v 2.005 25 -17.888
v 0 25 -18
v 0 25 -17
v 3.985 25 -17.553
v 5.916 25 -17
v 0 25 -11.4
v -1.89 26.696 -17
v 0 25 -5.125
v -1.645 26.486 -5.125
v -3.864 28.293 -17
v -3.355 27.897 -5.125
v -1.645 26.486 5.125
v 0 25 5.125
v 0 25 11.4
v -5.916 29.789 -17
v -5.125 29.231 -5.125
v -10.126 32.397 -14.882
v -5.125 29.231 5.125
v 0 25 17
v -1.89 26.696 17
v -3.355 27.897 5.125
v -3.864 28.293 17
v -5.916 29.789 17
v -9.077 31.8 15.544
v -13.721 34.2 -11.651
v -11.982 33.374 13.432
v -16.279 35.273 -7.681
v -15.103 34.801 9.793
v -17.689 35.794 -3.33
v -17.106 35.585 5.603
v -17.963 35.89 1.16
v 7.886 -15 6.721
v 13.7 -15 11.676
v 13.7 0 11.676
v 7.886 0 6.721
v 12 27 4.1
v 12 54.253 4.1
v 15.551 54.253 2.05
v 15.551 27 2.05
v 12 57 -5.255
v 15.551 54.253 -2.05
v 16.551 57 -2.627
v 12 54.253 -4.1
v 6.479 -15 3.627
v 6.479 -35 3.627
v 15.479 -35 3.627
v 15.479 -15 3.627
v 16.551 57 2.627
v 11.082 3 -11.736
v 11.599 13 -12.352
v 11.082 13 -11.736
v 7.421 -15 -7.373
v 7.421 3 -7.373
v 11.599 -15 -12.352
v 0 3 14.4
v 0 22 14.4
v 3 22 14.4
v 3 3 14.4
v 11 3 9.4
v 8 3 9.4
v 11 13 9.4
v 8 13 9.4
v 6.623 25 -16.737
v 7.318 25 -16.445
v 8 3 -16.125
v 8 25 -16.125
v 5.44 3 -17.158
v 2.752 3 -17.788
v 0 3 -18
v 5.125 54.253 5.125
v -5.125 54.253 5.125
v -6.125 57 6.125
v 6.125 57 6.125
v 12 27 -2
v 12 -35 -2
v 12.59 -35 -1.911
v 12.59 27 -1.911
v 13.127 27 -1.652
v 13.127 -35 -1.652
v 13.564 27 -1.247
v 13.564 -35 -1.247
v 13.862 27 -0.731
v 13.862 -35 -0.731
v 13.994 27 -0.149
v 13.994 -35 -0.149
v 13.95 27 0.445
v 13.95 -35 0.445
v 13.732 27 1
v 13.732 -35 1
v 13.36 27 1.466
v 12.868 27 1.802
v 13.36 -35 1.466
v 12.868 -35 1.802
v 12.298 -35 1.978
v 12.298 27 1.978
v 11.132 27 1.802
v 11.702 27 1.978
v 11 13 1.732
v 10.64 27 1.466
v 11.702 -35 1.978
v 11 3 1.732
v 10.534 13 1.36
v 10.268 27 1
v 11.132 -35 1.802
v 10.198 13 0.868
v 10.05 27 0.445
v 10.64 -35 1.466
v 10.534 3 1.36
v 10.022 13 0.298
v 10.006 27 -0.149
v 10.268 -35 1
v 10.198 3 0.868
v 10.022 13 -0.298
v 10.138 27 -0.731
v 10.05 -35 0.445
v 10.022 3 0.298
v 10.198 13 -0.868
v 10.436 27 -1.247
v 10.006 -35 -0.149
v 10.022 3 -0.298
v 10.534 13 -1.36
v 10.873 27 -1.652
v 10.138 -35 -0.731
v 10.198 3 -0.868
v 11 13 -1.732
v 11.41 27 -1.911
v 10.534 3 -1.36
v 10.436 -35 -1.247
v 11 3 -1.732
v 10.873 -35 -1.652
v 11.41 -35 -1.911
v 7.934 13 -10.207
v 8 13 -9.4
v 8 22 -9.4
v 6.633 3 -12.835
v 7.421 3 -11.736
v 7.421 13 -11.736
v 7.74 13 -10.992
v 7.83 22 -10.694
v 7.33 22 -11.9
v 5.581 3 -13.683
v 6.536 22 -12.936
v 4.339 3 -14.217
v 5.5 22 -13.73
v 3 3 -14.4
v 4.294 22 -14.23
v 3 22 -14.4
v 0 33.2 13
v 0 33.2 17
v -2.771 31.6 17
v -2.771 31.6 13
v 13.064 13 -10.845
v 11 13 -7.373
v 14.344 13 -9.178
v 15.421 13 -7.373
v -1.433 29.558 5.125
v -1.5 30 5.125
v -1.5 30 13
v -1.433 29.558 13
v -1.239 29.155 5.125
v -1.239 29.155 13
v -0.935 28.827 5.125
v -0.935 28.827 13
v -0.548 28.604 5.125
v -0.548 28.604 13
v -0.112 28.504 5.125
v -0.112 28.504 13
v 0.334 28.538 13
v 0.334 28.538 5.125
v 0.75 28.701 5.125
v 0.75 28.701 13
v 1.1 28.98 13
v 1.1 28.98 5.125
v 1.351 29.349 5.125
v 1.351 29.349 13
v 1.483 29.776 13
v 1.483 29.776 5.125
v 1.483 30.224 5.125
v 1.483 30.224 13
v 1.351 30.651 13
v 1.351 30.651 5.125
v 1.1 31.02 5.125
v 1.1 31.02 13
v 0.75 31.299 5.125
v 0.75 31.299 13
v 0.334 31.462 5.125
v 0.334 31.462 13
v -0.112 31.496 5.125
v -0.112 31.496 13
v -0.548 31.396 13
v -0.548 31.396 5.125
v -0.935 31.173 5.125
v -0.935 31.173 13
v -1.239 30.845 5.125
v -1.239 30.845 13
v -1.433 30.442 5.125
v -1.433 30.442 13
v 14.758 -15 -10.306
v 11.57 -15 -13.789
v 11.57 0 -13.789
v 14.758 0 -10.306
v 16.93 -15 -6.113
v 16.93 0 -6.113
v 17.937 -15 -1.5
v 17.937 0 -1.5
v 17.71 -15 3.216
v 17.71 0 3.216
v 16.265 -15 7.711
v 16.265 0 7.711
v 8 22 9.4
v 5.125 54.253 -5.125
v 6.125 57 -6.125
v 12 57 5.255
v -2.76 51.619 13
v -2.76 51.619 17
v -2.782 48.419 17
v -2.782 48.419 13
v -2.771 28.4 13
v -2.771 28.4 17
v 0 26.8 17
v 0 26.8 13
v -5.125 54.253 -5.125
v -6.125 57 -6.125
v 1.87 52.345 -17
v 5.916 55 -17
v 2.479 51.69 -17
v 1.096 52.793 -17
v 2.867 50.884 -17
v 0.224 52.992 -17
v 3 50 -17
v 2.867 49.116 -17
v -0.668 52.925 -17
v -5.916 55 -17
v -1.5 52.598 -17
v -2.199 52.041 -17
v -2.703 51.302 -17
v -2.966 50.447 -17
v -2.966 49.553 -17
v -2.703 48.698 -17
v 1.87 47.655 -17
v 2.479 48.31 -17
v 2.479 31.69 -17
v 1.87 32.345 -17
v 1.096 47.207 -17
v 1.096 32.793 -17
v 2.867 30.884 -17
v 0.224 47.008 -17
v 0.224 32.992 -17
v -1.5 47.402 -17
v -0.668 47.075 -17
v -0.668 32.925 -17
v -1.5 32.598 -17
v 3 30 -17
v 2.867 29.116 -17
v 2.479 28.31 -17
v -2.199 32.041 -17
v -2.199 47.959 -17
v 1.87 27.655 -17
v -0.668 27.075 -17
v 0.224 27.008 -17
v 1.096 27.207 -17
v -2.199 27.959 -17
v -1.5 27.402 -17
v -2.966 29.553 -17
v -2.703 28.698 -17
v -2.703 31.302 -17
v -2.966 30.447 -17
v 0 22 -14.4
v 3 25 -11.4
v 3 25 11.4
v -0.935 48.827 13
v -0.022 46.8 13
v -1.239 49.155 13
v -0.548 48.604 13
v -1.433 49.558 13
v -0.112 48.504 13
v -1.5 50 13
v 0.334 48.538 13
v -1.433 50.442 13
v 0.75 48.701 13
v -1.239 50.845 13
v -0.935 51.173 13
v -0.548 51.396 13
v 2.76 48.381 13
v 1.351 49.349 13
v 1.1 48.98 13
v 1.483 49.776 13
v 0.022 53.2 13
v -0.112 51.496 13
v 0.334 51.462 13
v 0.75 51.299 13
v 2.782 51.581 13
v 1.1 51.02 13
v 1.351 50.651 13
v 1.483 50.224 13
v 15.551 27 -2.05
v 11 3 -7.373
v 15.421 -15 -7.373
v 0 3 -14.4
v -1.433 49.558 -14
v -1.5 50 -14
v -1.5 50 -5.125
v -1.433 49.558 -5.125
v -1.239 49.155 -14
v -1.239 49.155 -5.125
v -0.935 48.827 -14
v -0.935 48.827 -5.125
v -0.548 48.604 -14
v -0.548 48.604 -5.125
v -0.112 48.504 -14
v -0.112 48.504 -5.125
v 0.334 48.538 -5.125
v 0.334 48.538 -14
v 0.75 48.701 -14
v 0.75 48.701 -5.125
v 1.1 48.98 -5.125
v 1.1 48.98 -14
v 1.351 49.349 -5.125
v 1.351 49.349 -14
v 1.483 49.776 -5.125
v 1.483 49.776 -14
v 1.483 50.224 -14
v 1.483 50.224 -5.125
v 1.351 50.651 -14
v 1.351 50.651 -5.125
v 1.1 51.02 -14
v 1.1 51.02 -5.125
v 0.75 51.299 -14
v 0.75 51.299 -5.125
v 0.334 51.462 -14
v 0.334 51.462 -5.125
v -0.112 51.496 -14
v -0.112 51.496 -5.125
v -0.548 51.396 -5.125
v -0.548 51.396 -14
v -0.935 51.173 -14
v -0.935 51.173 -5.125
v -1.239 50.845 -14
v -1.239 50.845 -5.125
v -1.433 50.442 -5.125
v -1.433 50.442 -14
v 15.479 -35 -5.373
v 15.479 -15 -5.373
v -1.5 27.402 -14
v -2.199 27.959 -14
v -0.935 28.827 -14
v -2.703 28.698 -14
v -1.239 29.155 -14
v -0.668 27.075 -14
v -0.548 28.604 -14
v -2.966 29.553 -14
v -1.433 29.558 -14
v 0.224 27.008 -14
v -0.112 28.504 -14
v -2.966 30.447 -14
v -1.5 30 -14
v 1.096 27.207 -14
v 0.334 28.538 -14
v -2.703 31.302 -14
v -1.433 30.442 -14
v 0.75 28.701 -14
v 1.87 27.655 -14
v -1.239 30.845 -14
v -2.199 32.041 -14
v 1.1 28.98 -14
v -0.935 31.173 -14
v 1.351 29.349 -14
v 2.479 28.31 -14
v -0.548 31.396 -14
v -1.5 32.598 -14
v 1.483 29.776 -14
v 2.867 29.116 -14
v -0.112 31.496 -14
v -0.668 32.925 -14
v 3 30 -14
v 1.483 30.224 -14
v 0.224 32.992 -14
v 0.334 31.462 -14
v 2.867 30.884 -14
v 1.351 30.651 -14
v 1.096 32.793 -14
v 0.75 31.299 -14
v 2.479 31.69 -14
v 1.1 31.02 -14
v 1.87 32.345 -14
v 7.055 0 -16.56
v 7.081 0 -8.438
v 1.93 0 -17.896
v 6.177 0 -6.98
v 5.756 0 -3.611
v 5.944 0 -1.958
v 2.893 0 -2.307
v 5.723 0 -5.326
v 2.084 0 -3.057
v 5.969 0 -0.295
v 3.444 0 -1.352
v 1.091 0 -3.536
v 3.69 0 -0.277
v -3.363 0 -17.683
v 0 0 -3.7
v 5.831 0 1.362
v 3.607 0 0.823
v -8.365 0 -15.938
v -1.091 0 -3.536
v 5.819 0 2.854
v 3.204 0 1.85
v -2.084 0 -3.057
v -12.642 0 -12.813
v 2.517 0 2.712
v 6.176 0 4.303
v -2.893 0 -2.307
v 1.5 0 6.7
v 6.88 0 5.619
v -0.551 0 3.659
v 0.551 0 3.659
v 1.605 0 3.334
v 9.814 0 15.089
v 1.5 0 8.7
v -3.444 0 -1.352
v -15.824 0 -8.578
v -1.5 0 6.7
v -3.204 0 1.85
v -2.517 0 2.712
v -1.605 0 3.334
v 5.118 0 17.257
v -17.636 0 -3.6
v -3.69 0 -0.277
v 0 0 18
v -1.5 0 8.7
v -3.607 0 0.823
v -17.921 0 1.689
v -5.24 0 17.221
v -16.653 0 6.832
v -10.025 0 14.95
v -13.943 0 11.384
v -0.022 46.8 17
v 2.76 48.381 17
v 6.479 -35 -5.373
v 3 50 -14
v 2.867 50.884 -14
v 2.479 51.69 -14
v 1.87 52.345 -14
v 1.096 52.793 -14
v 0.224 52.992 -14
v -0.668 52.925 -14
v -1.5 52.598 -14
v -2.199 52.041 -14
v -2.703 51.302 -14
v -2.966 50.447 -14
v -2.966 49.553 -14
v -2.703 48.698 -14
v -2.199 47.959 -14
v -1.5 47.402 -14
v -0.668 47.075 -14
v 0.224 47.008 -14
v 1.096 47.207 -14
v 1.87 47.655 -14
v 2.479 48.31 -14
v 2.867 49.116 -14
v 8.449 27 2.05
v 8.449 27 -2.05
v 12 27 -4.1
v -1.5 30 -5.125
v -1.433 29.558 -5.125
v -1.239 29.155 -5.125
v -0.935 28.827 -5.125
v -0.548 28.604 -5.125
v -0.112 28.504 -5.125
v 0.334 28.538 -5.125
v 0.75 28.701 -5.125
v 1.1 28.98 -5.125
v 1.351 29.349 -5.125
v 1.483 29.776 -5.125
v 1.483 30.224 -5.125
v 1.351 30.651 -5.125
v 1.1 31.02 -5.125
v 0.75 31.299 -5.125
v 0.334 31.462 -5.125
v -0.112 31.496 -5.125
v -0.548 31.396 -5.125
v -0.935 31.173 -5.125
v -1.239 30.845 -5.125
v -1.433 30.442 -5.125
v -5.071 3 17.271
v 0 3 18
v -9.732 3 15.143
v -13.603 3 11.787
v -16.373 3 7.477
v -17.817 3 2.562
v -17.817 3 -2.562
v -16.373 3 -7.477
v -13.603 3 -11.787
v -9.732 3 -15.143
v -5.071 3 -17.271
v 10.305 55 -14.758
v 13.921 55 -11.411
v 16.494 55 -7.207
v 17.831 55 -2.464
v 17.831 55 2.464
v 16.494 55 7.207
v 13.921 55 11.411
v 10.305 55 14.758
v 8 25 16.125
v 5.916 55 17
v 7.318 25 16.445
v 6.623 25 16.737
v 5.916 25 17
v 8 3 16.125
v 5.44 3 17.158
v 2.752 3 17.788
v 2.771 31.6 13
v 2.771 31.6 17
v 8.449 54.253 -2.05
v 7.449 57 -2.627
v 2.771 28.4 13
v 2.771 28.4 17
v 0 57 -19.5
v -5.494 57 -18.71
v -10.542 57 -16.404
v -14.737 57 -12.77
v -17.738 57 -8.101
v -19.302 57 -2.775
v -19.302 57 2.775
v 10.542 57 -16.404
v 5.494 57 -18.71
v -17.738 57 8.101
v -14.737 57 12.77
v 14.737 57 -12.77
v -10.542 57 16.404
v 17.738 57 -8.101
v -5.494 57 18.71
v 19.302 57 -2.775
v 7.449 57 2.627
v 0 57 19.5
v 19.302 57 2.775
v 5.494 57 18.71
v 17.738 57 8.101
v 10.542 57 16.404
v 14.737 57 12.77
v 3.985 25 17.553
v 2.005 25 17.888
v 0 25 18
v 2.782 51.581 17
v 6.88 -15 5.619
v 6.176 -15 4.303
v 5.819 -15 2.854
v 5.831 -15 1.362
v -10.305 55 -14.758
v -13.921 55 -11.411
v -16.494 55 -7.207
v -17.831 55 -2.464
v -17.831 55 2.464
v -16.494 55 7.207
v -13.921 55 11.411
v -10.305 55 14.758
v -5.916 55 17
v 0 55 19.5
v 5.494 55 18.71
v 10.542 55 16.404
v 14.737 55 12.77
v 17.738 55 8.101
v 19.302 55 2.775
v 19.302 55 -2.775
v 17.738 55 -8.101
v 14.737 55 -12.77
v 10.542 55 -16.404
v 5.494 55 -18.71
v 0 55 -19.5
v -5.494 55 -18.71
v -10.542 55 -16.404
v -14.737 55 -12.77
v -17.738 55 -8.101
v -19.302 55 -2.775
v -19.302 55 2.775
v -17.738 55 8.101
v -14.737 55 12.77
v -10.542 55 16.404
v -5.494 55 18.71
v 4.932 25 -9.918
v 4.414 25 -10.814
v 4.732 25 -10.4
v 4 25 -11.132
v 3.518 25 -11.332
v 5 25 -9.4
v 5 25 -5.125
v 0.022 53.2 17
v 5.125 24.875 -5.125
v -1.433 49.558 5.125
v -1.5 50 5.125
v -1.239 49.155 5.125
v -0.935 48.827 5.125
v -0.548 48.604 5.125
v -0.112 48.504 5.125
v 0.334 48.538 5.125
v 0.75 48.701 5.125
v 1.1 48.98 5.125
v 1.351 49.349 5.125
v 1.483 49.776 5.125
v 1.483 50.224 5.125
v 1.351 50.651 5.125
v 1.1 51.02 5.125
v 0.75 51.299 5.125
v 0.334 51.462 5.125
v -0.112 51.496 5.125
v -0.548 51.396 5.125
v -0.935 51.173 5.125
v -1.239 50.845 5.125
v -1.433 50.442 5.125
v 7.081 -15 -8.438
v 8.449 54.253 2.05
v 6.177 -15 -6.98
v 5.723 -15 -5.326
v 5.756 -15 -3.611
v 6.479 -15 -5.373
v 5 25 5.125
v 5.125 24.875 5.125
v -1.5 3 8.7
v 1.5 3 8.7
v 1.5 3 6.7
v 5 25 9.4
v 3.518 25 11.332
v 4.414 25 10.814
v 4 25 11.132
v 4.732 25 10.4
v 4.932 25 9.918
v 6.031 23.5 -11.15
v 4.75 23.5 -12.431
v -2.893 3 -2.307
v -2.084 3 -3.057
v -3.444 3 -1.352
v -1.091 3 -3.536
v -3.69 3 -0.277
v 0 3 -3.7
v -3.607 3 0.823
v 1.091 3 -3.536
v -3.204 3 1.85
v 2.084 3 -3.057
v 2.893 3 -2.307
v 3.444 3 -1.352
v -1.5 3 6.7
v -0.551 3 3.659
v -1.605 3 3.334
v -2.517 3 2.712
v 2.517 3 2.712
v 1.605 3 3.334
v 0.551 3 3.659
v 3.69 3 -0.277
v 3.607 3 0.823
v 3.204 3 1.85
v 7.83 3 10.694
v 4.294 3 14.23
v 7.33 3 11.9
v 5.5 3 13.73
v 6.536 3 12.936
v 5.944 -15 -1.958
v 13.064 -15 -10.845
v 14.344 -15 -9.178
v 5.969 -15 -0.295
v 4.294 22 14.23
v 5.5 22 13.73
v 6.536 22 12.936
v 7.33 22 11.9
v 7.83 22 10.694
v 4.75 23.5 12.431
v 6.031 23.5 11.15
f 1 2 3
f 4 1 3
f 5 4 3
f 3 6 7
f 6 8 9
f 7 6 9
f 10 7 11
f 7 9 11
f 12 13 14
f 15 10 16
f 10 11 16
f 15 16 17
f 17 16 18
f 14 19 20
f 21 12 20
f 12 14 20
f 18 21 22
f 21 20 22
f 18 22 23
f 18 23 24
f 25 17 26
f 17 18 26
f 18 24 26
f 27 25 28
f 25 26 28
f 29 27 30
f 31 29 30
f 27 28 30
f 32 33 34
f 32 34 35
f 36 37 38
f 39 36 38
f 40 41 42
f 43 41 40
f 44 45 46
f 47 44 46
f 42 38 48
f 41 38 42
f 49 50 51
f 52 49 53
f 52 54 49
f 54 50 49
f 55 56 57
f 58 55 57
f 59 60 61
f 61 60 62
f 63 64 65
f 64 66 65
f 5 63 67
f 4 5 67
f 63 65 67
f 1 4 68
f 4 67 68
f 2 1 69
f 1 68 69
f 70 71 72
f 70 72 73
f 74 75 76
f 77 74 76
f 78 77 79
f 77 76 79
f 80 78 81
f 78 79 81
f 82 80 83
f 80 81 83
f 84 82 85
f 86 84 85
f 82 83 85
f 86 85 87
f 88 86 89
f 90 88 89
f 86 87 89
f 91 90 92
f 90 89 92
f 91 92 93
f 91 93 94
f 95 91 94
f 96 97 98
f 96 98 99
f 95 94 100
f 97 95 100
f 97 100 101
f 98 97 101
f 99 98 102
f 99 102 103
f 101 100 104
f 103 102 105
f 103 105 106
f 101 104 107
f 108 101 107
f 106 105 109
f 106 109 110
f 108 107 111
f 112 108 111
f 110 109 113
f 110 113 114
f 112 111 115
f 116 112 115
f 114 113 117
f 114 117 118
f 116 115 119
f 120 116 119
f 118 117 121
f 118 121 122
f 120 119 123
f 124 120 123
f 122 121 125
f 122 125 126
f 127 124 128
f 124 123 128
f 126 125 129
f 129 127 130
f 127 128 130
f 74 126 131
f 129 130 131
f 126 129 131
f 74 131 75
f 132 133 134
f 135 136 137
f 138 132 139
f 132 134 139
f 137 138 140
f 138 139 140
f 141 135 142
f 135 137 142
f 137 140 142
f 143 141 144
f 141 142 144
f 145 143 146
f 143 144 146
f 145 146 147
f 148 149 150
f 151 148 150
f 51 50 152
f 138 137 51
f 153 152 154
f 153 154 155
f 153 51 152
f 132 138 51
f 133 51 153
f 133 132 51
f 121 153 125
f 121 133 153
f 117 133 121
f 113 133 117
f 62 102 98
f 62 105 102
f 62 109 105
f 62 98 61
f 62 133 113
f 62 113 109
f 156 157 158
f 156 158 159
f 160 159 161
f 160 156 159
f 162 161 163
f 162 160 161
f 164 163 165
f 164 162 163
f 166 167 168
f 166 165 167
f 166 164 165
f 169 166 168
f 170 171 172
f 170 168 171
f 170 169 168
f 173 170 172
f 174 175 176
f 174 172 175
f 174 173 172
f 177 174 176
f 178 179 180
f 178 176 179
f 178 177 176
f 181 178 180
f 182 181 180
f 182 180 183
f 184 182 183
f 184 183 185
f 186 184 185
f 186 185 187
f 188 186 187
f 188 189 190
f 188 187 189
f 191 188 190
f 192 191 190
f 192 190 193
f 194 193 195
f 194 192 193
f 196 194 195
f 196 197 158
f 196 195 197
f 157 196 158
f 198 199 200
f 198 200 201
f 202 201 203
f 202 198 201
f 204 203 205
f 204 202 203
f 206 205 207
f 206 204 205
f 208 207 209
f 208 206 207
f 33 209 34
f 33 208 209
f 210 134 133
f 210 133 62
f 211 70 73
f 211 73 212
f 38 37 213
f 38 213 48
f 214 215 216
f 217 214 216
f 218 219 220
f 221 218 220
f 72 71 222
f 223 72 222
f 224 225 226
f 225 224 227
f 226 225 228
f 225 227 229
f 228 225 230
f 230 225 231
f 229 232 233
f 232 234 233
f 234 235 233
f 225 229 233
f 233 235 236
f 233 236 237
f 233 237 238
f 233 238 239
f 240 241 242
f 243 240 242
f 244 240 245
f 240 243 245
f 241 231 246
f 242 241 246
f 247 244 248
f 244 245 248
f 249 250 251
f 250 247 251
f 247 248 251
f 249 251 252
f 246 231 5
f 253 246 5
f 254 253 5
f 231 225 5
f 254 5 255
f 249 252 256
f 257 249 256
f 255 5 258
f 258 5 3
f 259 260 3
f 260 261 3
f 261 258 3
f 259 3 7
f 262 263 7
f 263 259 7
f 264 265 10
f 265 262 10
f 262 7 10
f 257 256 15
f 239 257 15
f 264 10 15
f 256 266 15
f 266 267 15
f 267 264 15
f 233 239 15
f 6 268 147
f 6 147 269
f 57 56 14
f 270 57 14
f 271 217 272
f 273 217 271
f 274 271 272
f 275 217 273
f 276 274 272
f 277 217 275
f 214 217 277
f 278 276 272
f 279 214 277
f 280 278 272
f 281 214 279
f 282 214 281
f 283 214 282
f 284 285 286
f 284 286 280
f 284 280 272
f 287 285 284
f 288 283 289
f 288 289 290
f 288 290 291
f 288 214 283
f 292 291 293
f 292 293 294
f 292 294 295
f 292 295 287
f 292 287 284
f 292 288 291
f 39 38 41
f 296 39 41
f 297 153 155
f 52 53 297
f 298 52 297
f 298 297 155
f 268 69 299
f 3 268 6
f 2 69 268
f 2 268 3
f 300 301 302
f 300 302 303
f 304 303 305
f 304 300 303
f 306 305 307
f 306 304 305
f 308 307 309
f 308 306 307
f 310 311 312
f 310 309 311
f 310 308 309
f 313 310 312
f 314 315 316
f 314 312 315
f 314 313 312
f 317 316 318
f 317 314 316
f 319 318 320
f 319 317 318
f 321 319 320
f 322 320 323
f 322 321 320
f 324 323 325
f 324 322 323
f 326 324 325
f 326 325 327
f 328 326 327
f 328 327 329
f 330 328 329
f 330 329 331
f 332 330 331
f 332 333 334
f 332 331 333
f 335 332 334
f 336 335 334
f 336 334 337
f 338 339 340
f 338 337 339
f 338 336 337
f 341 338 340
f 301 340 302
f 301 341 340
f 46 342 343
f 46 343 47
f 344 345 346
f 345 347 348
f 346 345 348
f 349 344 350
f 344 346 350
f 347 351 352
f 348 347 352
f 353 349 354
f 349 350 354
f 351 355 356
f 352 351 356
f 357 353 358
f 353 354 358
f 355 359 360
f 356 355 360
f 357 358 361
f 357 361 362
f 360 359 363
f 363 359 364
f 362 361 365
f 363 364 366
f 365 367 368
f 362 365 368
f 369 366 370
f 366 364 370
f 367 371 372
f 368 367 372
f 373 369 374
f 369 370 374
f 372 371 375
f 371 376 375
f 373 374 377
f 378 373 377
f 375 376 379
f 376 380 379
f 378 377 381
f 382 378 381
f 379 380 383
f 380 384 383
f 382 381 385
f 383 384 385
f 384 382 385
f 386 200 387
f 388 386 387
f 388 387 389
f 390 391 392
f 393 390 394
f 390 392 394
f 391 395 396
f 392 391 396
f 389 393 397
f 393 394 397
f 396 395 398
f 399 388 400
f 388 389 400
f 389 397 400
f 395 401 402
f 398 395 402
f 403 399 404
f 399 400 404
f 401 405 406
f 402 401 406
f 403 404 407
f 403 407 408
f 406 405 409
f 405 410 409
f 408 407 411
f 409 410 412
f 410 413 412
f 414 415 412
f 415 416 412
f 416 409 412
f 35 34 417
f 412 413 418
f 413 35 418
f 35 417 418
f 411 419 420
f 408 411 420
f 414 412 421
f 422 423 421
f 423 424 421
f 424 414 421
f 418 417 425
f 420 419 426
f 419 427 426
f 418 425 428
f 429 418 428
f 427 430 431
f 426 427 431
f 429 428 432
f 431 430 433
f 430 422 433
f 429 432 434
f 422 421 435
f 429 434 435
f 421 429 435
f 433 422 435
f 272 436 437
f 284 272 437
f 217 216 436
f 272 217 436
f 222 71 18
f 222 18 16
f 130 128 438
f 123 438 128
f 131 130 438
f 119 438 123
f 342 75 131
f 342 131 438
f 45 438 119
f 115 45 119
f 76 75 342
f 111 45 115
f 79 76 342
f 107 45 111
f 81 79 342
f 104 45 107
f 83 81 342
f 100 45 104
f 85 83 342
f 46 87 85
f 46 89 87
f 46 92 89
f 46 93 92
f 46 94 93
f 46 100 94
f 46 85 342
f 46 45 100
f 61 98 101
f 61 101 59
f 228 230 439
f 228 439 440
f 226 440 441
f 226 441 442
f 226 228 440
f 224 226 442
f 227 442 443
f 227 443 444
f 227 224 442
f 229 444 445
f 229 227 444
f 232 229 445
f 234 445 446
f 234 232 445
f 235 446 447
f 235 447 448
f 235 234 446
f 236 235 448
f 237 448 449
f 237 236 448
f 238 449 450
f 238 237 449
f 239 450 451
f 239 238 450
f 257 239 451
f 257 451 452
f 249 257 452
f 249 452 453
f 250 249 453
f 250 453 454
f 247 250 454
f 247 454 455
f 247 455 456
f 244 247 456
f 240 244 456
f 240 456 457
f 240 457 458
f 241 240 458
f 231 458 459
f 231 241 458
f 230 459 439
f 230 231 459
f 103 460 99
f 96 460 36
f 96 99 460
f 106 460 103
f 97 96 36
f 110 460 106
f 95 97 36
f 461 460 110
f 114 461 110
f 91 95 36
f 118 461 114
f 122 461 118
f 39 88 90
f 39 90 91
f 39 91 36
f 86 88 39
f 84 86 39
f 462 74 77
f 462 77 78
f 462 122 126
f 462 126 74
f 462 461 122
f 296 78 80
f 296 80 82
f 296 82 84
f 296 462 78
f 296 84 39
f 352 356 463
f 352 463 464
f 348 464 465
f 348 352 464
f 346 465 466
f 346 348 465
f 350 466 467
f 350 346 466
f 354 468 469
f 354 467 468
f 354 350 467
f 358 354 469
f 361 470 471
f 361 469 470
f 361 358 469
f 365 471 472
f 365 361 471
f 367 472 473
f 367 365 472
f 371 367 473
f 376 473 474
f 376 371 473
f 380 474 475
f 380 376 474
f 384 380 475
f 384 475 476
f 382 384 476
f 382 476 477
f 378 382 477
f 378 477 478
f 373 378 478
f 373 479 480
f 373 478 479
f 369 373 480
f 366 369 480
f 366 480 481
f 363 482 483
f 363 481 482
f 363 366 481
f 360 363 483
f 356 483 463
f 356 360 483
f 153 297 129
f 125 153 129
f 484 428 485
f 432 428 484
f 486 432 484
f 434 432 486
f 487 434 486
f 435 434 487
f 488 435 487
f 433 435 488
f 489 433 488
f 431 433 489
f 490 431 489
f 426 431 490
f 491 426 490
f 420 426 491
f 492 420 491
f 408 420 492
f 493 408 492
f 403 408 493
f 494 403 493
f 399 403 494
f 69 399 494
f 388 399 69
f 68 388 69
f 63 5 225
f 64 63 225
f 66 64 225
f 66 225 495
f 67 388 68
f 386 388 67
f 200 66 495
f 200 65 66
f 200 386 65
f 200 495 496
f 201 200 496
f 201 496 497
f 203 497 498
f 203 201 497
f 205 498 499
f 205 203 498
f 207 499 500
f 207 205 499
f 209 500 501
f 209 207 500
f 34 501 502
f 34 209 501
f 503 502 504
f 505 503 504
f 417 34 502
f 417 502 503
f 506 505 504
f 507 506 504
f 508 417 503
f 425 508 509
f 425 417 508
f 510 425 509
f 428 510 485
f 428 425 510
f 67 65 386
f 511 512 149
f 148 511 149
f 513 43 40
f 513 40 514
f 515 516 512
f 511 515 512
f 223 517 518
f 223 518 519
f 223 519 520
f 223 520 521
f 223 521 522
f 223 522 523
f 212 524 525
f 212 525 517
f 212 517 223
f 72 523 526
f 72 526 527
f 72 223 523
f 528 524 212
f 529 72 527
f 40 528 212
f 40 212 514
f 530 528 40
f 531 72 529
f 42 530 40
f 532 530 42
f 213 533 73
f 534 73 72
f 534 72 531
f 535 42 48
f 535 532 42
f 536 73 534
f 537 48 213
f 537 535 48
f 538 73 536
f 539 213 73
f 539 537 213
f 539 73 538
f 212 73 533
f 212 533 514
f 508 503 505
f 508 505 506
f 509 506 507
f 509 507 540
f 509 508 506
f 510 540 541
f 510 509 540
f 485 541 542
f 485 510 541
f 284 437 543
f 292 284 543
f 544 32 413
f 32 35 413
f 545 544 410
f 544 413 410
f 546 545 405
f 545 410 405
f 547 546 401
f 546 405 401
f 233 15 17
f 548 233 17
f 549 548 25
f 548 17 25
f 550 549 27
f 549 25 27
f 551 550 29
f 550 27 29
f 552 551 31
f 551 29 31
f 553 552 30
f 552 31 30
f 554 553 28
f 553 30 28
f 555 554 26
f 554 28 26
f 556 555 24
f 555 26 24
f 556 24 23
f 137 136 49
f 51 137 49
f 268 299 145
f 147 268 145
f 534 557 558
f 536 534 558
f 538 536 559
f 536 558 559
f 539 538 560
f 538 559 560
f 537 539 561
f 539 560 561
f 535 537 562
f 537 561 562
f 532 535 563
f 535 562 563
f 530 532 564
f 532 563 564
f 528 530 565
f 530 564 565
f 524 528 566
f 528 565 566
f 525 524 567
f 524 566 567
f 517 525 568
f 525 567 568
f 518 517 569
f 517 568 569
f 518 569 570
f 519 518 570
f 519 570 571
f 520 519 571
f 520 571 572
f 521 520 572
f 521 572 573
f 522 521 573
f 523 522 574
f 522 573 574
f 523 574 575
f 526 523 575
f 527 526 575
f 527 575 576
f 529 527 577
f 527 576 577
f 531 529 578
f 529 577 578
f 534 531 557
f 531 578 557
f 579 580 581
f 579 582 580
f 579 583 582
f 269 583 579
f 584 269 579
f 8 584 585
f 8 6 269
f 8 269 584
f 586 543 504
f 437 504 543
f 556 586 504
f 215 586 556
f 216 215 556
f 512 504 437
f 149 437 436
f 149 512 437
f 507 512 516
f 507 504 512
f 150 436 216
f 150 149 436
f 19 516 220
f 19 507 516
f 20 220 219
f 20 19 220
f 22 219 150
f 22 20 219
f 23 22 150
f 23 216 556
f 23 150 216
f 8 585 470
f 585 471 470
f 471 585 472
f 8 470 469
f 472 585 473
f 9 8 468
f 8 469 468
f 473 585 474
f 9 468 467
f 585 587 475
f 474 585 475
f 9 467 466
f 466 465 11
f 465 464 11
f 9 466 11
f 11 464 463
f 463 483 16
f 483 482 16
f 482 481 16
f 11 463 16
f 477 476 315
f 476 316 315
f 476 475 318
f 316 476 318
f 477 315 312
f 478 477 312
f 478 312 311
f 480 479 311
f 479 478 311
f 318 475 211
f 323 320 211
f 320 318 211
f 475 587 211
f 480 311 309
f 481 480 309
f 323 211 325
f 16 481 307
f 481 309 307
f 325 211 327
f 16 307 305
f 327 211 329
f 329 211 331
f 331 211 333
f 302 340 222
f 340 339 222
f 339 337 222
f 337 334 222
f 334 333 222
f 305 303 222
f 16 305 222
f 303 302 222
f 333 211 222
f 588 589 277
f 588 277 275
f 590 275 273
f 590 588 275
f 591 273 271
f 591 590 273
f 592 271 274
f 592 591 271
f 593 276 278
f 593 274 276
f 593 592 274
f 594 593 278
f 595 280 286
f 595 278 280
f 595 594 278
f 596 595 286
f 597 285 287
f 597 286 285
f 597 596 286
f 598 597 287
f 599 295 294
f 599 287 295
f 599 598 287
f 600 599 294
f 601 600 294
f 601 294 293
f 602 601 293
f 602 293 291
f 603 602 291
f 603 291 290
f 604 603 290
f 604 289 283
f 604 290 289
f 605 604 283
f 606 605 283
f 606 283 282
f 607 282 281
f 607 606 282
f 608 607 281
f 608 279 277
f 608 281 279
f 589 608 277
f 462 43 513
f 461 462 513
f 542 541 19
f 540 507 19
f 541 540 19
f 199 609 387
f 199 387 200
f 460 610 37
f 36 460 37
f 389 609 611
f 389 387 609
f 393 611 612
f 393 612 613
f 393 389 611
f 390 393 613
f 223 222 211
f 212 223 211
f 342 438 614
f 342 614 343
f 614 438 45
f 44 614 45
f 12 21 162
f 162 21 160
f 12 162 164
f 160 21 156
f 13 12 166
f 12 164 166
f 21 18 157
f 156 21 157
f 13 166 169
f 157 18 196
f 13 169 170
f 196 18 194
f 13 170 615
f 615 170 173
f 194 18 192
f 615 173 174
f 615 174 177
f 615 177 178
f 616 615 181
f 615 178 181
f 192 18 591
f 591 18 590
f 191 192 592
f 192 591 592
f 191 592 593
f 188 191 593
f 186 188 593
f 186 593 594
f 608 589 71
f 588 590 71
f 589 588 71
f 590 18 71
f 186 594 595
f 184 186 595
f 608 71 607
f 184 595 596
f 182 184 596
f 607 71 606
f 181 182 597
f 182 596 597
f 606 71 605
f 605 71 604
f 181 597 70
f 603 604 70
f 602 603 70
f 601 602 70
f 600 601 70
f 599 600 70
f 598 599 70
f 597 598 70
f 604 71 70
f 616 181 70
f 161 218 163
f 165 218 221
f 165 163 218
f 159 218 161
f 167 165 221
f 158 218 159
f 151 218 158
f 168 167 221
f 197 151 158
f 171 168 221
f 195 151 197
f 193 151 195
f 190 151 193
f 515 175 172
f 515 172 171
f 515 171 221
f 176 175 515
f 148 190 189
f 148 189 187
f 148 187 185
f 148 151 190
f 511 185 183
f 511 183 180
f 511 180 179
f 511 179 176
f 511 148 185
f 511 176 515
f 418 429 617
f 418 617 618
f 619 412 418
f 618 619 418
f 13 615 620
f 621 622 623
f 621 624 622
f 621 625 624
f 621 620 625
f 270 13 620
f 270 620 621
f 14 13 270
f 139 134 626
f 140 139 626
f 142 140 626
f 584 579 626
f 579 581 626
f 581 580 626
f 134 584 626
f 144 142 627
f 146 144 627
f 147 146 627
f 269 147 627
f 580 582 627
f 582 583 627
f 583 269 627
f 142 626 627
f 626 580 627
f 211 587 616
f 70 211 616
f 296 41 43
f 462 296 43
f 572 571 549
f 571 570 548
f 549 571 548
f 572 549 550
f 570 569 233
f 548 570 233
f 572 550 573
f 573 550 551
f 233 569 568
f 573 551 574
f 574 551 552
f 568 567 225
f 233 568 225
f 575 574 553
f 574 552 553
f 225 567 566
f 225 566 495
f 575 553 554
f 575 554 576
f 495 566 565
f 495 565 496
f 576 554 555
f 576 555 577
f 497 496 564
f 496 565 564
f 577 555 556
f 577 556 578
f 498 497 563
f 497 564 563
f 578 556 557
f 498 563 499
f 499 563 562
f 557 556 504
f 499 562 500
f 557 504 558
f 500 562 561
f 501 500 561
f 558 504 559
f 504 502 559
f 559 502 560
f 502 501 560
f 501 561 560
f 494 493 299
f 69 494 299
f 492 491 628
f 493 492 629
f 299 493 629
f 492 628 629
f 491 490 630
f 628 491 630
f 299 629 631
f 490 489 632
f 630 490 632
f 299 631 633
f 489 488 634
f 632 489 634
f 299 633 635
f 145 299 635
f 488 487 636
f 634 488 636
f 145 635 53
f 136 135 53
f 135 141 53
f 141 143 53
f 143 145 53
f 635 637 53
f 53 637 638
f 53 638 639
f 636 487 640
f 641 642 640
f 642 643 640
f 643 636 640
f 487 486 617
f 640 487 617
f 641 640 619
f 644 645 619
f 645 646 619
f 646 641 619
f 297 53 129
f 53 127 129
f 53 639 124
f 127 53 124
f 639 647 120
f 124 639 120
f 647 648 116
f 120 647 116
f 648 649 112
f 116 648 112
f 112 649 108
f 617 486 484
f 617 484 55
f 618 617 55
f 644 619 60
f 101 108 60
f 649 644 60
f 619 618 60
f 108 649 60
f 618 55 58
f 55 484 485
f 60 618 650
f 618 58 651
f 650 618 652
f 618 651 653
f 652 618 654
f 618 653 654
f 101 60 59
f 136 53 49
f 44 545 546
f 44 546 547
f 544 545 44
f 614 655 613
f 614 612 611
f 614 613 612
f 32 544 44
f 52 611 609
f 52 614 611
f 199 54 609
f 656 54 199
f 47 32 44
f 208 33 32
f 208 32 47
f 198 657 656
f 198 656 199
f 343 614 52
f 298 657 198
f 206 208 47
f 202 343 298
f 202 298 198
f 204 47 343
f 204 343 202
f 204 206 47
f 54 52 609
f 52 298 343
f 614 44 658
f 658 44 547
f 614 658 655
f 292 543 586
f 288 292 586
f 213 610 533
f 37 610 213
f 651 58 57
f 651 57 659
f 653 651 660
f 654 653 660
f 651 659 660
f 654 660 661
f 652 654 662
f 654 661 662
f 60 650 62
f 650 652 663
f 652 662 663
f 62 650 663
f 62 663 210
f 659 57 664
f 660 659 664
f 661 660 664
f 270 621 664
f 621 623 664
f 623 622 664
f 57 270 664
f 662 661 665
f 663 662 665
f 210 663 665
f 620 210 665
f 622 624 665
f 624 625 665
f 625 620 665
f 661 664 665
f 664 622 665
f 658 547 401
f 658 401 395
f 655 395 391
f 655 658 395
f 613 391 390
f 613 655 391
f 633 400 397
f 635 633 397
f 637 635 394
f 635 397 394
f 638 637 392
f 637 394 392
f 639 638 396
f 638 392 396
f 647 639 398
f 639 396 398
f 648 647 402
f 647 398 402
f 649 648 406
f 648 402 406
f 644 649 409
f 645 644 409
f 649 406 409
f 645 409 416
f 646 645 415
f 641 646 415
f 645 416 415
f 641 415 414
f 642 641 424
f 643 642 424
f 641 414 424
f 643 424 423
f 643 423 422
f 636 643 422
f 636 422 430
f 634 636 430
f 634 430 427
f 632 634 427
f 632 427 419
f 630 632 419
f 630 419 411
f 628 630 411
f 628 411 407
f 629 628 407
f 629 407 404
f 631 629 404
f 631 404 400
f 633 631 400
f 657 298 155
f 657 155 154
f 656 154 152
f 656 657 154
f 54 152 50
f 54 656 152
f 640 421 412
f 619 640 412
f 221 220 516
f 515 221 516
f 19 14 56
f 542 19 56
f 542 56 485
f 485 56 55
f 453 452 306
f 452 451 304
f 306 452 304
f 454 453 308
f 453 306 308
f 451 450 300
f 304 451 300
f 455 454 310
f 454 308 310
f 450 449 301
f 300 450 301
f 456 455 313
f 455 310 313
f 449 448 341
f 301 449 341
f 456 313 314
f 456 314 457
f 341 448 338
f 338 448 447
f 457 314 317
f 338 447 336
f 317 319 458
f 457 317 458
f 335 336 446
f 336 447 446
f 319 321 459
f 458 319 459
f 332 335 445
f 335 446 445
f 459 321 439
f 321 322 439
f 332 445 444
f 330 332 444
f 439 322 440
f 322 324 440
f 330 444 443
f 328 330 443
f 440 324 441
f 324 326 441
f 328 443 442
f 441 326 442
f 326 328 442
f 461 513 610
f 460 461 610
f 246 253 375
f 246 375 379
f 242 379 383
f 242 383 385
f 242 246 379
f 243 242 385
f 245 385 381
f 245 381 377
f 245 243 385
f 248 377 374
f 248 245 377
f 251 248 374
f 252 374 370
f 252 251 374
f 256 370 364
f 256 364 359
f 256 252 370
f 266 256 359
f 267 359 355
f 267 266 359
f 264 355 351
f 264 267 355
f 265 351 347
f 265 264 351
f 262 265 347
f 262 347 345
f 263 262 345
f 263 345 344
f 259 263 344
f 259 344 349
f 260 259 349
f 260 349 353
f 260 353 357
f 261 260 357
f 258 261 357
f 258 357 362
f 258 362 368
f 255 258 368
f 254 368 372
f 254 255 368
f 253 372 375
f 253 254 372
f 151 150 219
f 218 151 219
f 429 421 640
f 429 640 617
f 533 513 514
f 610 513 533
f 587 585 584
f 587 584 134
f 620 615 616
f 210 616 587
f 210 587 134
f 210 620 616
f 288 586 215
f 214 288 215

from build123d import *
from build123d.topology import SkipClean

# Parameters (mm, degrees)
SKETCH_1_R          = 18
EXTRUDE_1_DEPTH     = 55
SKETCH_2_R          = 19.5
EXTRUDE_2_DEPTH     = 2
SKETCH_3_W          = 10.25
SKETCH_3_H          = 10.25
CUT_EXTRUDE_1_DEPTH = 40
EXTRUDE_START       = 15
EXTRUDE_3_DEPTH     = 15
BOSS_EXTRUDE1_START = 20
SKETCH1_R           = 18
BOSS_EXTRUDE1_DEPTH = 20
BOSS_EXTRUDE2_START = 7
SKETCH3_R           = 18
BOSS_EXTRUDE2_DEPTH = 7
SKETCH4_W           = 10.2
SKETCH4_H           = 10.2
CUT_EXTRUDE2_DEPTH  = 27
CUT_EXTRUDE4_DEPTH  = 25
BOSS_EXTRUDE3_DEPTH = 3
SKETCH9_W           = 36
SKETCH9_H           = 22
CUT_EXTRUDE5_DEPTH  = 8
SKETCH10_R          = 3.7
SKETCH10_W          = 3
SKETCH10_H          = 2
CUT_EXTRUDE6_DEPTH  = 10
SKETCH11_R          = 2
CUT_EXTRUDE7_DEPTH  = 102
SKETCH15_R          = 18
CUT_EXTRUDE9_DEPTH  = 27
CUT_EXTRUDE11_DEPTH = 30
SKETCH18_R          = 1.5
CUT_EXTRUDE12_DEPTH = 71.437915926
SKETCH19_R          = 3
CUT_EXTRUDE13_DEPTH = 3
BOSS_EXTRUDE5_DEPTH = 22
CUT_EXTRUDE16_DEPTH = 4
CUT_EXTRUDE17_DEPTH = 30
CUT_EXTRUDE18_DEPTH = 71.437915926
FILLET2_R           = 5
SKETCH30_W          = 18.8
SKETCH30_H          = 10
CUT_EXTRUDE20_DEPTH = 3
CHAMFER1_SIZE       = 1
CHAMFER1_SIZE2      = 2.747477419
CHAMFER2_SIZE       = 1
CHAMFER2_SIZE2      = 2.747477419
BOSS_EXTRUDE7_START = 20
SKETCH37_W          = 9
SKETCH37_H          = 9
SKETCH37_R          = 2
BOSS_EXTRUDE7_DEPTH = 20
CUT_EXTRUDE22_DEPTH = 15
CUT_EXTRUDE23_REACH = 79.101
SKETCH40_W          = 4.363156696
SKETCH40_H          = 4.363156696
CUT_EXTRUDE24_DEPTH = 10
FILLET7_R           = 6
CHAMFER3_SIZE       = 3


with BuildPart() as part:
    # Эскиз1 → Бобышка-Вытянуть1 (new body)
    with BuildSketch(Plane(origin=(0, 0, 0), x_dir=(1, 0, 0), z_dir=(0, 1, 0))):
        with Locations(Location((0, 0, 0), (0, 0, 270))):
            Circle(SKETCH_1_R)
    extrude(amount=EXTRUDE_1_DEPTH)

    # Эскиз2 → Бобышка-Вытянуть2 (add)
    with BuildSketch(Plane(origin=(0, 55, 0), x_dir=(1, 0, 0), z_dir=(0, 1, 0))):
        with Locations(Location((0, 0, 0), (0, 0, 270))):
            Circle(SKETCH_2_R)
    extrude(amount=EXTRUDE_2_DEPTH)

    # Эскиз3 → Вырез-Вытянуть1 (cut)
    with BuildSketch(Plane(origin=(0, 57, 0), x_dir=(1, 0, 0), z_dir=(0, 1, 0))):
        Rectangle(SKETCH_3_W, SKETCH_3_H)
    extrude(amount=-CUT_EXTRUDE_1_DEPTH, mode=Mode.SUBTRACT)

    # Эскиз4 → Бобышка-Вытянуть3 (add)
    with SkipClean():  # the faces are left unmerged after this step: merging them gives an invalid solid
        with BuildSketch(Plane.XZ.offset(EXTRUDE_START)):
            with BuildLine():
                Line((5.142300877, -6.128355545), (11.570176974, -13.788799976))
                ThreePointArc((11.570176974, -13.788799976), (17.937391115, -1.5), (13.69961987, 11.675633406))
                Line((13.69961987, 11.675633406), (5.142300877, 4.38257561))
                Line((5.142300877, 4.38257561), (5.142300877, -6.128355545))
            make_face()
        extrude(amount=-EXTRUDE_3_DEPTH)

    # Sketch1 → Boss-Extrude1 (add)
    with BuildSketch(Plane.XZ.offset(15).offset(BOSS_EXTRUDE1_START)):
        with Locations(Location((0, 0, 0), (0, 0, 270))):
            Circle(SKETCH1_R)
    extrude(amount=-BOSS_EXTRUDE1_DEPTH)

    # Sketch3 → Boss-Extrude2 (add)
    with BuildSketch(Plane.XZ.offset(35).offset(BOSS_EXTRUDE2_START)):
        with Locations(Location((0, 0, 0), (0, 0, 270))):
            Circle(SKETCH3_R)
    extrude(amount=-BOSS_EXTRUDE2_DEPTH)

    # Sketch4 → Cut-Extrude2 (cut)
    with BuildSketch(Plane.XZ.offset(42)):
        Rectangle(SKETCH4_W, SKETCH4_H)
    extrude(amount=-CUT_EXTRUDE2_DEPTH, mode=Mode.SUBTRACT)

    # Sketch6 → Cut-Extrude4 (cut)
    with BuildSketch(Plane.XZ):
        with BuildLine():
            Line((0, 18), (0, -18))
            ThreePointArc((0, -18), (-18, 0), (0, 18))
        make_face()
    extrude(amount=-CUT_EXTRUDE4_DEPTH, mode=Mode.SUBTRACT)

    # Sketch8 → Boss-Extrude3 (add)
    with BuildSketch(Plane.XZ):
        with BuildLine():
            Line((0, -18), (0, 18))
            ThreePointArc((0, 18), (-18, 0), (0, -18))
        make_face()
    extrude(amount=-BOSS_EXTRUDE3_DEPTH)

    # Sketch9 → Cut-Extrude5 (cut)
    with BuildSketch(Plane.ZY):
        with Locations((0, 14)):
            Rectangle(SKETCH9_W, SKETCH9_H)
    extrude(amount=-CUT_EXTRUDE5_DEPTH, mode=Mode.SUBTRACT)

    # Sketch10 → Cut-Extrude6 (cut)
    with BuildSketch(Plane.XZ):
        with Locations(Location((0, 0, 0), (0, 0, 270))):
            Circle(SKETCH10_R)
        with Locations((0, 7.7)):
            Rectangle(SKETCH10_W, SKETCH10_H)
    extrude(amount=-CUT_EXTRUDE6_DEPTH, mode=Mode.SUBTRACT)

    # Sketch11 → Cut-Extrude7 (cut)
    with BuildSketch(Plane.XZ.offset(42)):
        with Locations(Location((12, 0, 0), (0, 0, 270))):
            Circle(SKETCH11_R)
    extrude(amount=-CUT_EXTRUDE7_DEPTH, mode=Mode.SUBTRACT)

    # Sketch15 → Cut-Extrude9 (cut)
    with BuildSketch(Plane.XZ.offset(42)):
        with Locations(Location((0, 0, 0), (0, 0, 310))):
            Circle(SKETCH15_R)
    extrude(amount=-CUT_EXTRUDE9_DEPTH, mode=Mode.SUBTRACT)

    # Sketch17 → Cut-Extrude11 (cut)
    with BuildSketch(Plane.XZ.offset(-25)):
        with BuildLine():
            Line((5.916079783, -17), (-5.916079783, -17))
            ThreePointArc((-5.916079783, -17), (0, -18), (5.916079783, -17))
        make_face()
        with BuildLine():
            Line((5.916079783, 17), (-5.916079783, 17))
            ThreePointArc((-5.916079783, 17), (0, 18), (5.916079783, 17))
        make_face()
    extrude(amount=-CUT_EXTRUDE11_DEPTH, mode=Mode.SUBTRACT)

    # Sketch18 → Cut-Extrude12 (cut, through all)
    with BuildSketch(Plane.XY.offset(-17)):
        with Locations(Location((0, 30, 0), (0, 0, 180))):
            Circle(SKETCH18_R)
        with Locations(Location((0, 50, 0), (0, 0, 180))):
            Circle(SKETCH18_R)
    extrude(amount=CUT_EXTRUDE12_DEPTH, mode=Mode.SUBTRACT)

    # Sketch19 → Cut-Extrude13 (cut)
    with BuildSketch(Plane.XY.offset(-17)):
        with Locations((0, 30)):
            Circle(SKETCH19_R)
        with Locations((0, 50)):
            Circle(SKETCH19_R)
    extrude(amount=CUT_EXTRUDE13_DEPTH, mode=Mode.SUBTRACT)

    # Sketch23 → Boss-Extrude5 (add)
    with BuildSketch(Plane(origin=(0, 3, 0), x_dir=(1, 0, 0), z_dir=(0, 1, 0))):
        with BuildLine():
            Line((0, -14.4), (8, -14.4))
            Line((8, -14.4), (8, -16.124515497))
            ThreePointArc((8, -16.124515497), (4.108449894, -17.524857759), (0, -18))
            Line((0, -18), (0, -14.4))
        make_face()
        with BuildLine():
            Line((0, 14.4), (8, 14.4))
            Line((8, 14.4), (8, 16.124515497))
            ThreePointArc((8, 16.124515497), (4.108449894, 17.524857759), (0, 18))
            Line((0, 18), (0, 14.4))
        make_face()
    extrude(amount=BOSS_EXTRUDE5_DEPTH)

    # Sketch25 → Cut-Extrude16 (cut)
    with BuildSketch(Plane.XY.offset(17)):
        Polygon((2.771281292, 28.4), (2.771281292, 31.6), (0, 33.2), (-2.771281292, 31.6), (-2.771281292, 28.4), (0, 26.8), align=None)
        Polygon((-2.782126929, 48.418933983), (-0.021820128, 46.800074394), (2.760306801, 48.381140412), (2.782126929, 51.581066017), (0.021820128, 53.199925606), (-2.760306801, 51.618859588), align=None)
    extrude(amount=-CUT_EXTRUDE16_DEPTH, mode=Mode.SUBTRACT)

    # Sketch26 → Cut-Extrude17 (cut)
    with BuildSketch(Plane(origin=(0, 57, 0), x_dir=(1, 0, 0), z_dir=(0, 1, 0))):
        Polygon((8.449295844, -2.05), (12, -4.1), (15.550704156, -2.05), (15.550704156, 2.05), (12, 4.1), (8.449295844, 2.05), align=None)
    extrude(amount=-CUT_EXTRUDE17_DEPTH, mode=Mode.SUBTRACT)

    # Sketch27 → Cut-Extrude18 (cut, through all)
    with BuildSketch(Plane.XY.offset(17)):
        with BuildLine():
            Line((-20, 36.547005384), (-20, 25))
            Line((-20, 25), (0, 25))
            ThreePointArc((0, 25), (-9.324199199, 31.944024015), (-20, 36.547005384))
        make_face()
    extrude(amount=-CUT_EXTRUDE18_DEPTH, mode=Mode.SUBTRACT)

    # Fillet2
    fillet2_edges = [part.edges().sort_by_distance(p)[0] for p in [
        (8, 14, -14.4),
        (8, 14, 14.4),
    ]]
    fillet(fillet2_edges, radius=FILLET2_R)

    # Sketch30 → Cut-Extrude20 (cut)
    with BuildSketch(Plane.ZY.offset(-8)):
        with Locations((0, 8)):
            Rectangle(SKETCH30_W, SKETCH30_H)
    extrude(amount=-CUT_EXTRUDE20_DEPTH, mode=Mode.SUBTRACT)

    # Chamfer1
    chamfer1_edges = [part.edges().sort_by_distance(p)[0] for p in [
        (5.125, 57, 0),
        (0, 57, -5.125),
        (-5.125, 57, 0),
        (0, 57, 5.125),
    ]]
    chamfer1_side = [part.faces().sort_by_distance(p)[0] for p in [
        (0, 57, -18.948456711),
    ]]
    chamfer(chamfer1_edges, length=CHAMFER1_SIZE, length2=CHAMFER1_SIZE2, reference=chamfer1_side[0])

    # Chamfer2
    chamfer2_edges = [part.edges().sort_by_distance(p)[0] for p in [
        (8.449295844, 57, 0),
        (10.224647922, 57, 3.075),
        (13.775352078, 57, 3.075),
        (15.550704156, 57, 0),
        (13.775352078, 57, -3.075),
        (10.224647922, 57, -3.075),
    ]]
    chamfer2_side = [part.faces().sort_by_distance(p)[0] for p in [
        (6.676543289, 57, 0),
    ]]
    chamfer(chamfer2_edges, length=CHAMFER2_SIZE, length2=CHAMFER2_SIZE2, reference=chamfer2_side[0])

    # Sketch37 → Boss-Extrude7 (add)
    with BuildSketch(Plane.XZ.offset(15).offset(BOSS_EXTRUDE7_START)):
        with Locations((10.978822628, -0.872889968)):
            Rectangle(SKETCH37_W, SKETCH37_H)
        with Locations(Location((12, 0, 0), (0, 0, 270))):
            Circle(SKETCH37_R, mode=Mode.SUBTRACT)
    extrude(amount=-BOSS_EXTRUDE7_DEPTH)

    # Sketch38 → Cut-Extrude22 (cut)
    with BuildSketch(Plane.XZ.offset(15)):
        with BuildLine():
            Line((5.142300877, -6.128355545), (5.142300877, 4.38257561))
            ThreePointArc((5.142300877, 4.38257561), (5.978822628, -0.872889968), (5.142300877, -6.128355545))
        make_face()
    extrude(amount=-CUT_EXTRUDE22_DEPTH, mode=Mode.SUBTRACT)

    # Cut-Extrude23: up to this face of the body (flat: up to its plane)
    cut_extrude23_end = Plane(part.part.faces().sort_by_distance((9.450359937, 13, 0))[0])
    # Sketch39 → Cut-Extrude23 (cut, up to the picked face)
    with BuildSketch(Plane.XZ.offset(15), mode=Mode.PRIVATE) as cut_extrude23_sk1:
        with BuildLine():
            Line((7.420733648, -7.372889968), (15.420733648, -7.372889968))
            ThreePointArc((15.420733648, -7.372889968), (13.728515389, -10.030415688), (11.598853111, -12.352178848))
            Line((11.598853111, -12.352178848), (7.420733648, -7.372889968))
        make_face()
    cut_extrude23_tool1 = split(extrude(cut_extrude23_sk1.sketch, amount=-CUT_EXTRUDE23_REACH, mode=Mode.PRIVATE), bisect_by=cut_extrude23_end, keep=Keep.BOTH, mode=Mode.PRIVATE)
    add(cut_extrude23_tool1.solids().sort_by(Axis((11.596211, -15, -9.081847), (0, 1, 0)))[0], mode=Mode.SUBTRACT)

    # Sketch40 → Cut-Extrude24 (cut)
    with BuildSketch(Plane(origin=(0, 3, 0), x_dir=(1, 0, 0), z_dir=(0, 1, 0))):
        with Locations((9.602311996, 9.554468316)):
            Rectangle(SKETCH40_W, SKETCH40_H)
    extrude(amount=CUT_EXTRUDE24_DEPTH, mode=Mode.SUBTRACT)

    # Fillet7
    fillet7_edges = [part.edges().sort_by_distance(p)[0] for p in [
        (5.142300877, -7.5, 4.38257561),
        (5.142300877, -7.5, -6.128355545),
    ]]
    fillet(fillet7_edges, radius=FILLET7_R)

    # Chamfer3
    # the kernel refuses this chamfer: 3 mm, written as the material it adds along each edge
    with BuildSketch(Plane(origin=(0, 25, 14.4), x_dir=(0, -0.9996219169112968, 0.02749587661058619), z_dir=(1, 0, 0))) as chamfer3_piece_1_section:
        Polygon((CHAMFER3_SIZE * 0.999621916911, CHAMFER3_SIZE * 0.0274958766106), (-CHAMFER3_SIZE * 0.0274958766106, CHAMFER3_SIZE * 0.999621916911), (0, 0), align=None)
    chamfer3_piece_1 = extrude(amount=3, mode=Mode.PRIVATE)
    chamfer3_piece_1 = chamfer3_piece_1 & Plane(origin=(-34.324199199, -11.357246174, 13.709552738), x_dir=(0.6864839839775441, 0.727144923479714, 0), z_dir=(0, 0, 1)) * Cylinder(50, 18, mode=Mode.PRIVATE)
    add(chamfer3_piece_1)
    with BuildSketch(Plane(origin=(0, 25, 14.4), x_dir=(0, -0.9996219169112968, 0.02749587661058619), z_dir=(1, 0, 0))) as chamfer3_piece_2_section:
        Polygon((CHAMFER3_SIZE * 0.999621916911, CHAMFER3_SIZE * 0.0274958766106), (-CHAMFER3_SIZE * 0.0274958766106, CHAMFER3_SIZE * 0.999621916911), (0, 0), align=None)
    chamfer3_piece_2 = extrude(amount=3, mode=Mode.PRIVATE)
    chamfer3_piece_2 = chamfer3_piece_2 - Plane(origin=(-34.324199199, -11.357246174, 13.260106339), x_dir=(0.6864839839775441, 0.727144923479714, 0), z_dir=(0, 0, 1)) * Cylinder(50, 18, mode=Mode.PRIVATE)
    add(chamfer3_piece_2)
    with BuildSketch(Plane(origin=(0, 25, -14.4), x_dir=(0, -0.9996219169112968, -0.02749587661058619), z_dir=(1, 0, 0))) as chamfer3_piece_3_section:
        Polygon((CHAMFER3_SIZE * 0.999621916911, -CHAMFER3_SIZE * 0.0274958766106), (-CHAMFER3_SIZE * 0.0274958766106, -CHAMFER3_SIZE * 0.999621916911), (0, 0), align=None)
    chamfer3_piece_3 = extrude(amount=3, mode=Mode.PRIVATE)
    chamfer3_piece_3 = chamfer3_piece_3 & Plane(origin=(-34.324199199, -11.357246174, -13.709552738), x_dir=(0.6864839839775441, 0.727144923479714, 0), z_dir=(0, 0, 1)) * Cylinder(50, 18, mode=Mode.PRIVATE)
    add(chamfer3_piece_3)
    with BuildSketch(Plane(origin=(0, 25, -14.4), x_dir=(0, -0.9996219169112968, -0.02749587661058619), z_dir=(1, 0, 0))) as chamfer3_piece_4_section:
        Polygon((CHAMFER3_SIZE * 0.999621916911, -CHAMFER3_SIZE * 0.0274958766106), (-CHAMFER3_SIZE * 0.0274958766106, -CHAMFER3_SIZE * 0.999621916911), (0, 0), align=None)
    chamfer3_piece_4 = extrude(amount=3, mode=Mode.PRIVATE)
    chamfer3_piece_4 = chamfer3_piece_4 - Plane(origin=(-34.324199199, -11.357246174, -13.260106339), x_dir=(0.6864839839775441, 0.727144923479714, 0), z_dir=(0, 0, 1)) * Cylinder(50, 18, mode=Mode.PRIVATE)
    add(chamfer3_piece_4)
    with BuildSketch(Plane(origin=(3, 25, 9.4), x_dir=(0, 0, 1), z_dir=(-1, 0, 0))) as chamfer3_piece_5:
        Polygon((5, -CHAMFER3_SIZE), (5 - CHAMFER3_SIZE, 0), (5, 0), align=None)
    revolve(axis=Axis((3, 25, 9.4), (0, 1, 0)), revolution_arc=90)
    with BuildSketch(Plane(origin=(3, 25, -9.4), x_dir=(1, 0, 0), z_dir=(0, 0, 1))) as chamfer3_piece_6:
        Polygon((5, -CHAMFER3_SIZE), (5 - CHAMFER3_SIZE, 0), (5, 0), align=None)
    revolve(axis=Axis((3, 25, -9.4), (0, 1, 0)), revolution_arc=90)
    with BuildSketch(Plane(origin=(8, 25, 9.4), x_dir=(-0.9996219169112968, 0.027495876610586775, -6.983036009170595e-15), z_dir=(0, 0, -1))) as chamfer3_piece_7_section:
        Polygon((CHAMFER3_SIZE * 0.999621916911, -CHAMFER3_SIZE * 0.0274958766106), (-CHAMFER3_SIZE * 0.0274958766106, -CHAMFER3_SIZE * 0.999621916911), (0, 0), align=None)
    chamfer3_piece_7 = extrude(amount=18.8, mode=Mode.PRIVATE)
    chamfer3_piece_7 = split(chamfer3_piece_7, bisect_by=Plane(origin=(5.125, 25.046535353, 7.2625), z_dir=(-1, 0, 0)), keep=Keep.TOP, mode=Mode.PRIVATE)
    chamfer3_piece_7 = split(chamfer3_piece_7, bisect_by=Plane(origin=(5.041671012, 25.046535353, 5.125), z_dir=(0, 0, 1)), keep=Keep.TOP, mode=Mode.PRIVATE)
    add(chamfer3_piece_7)
    with BuildSketch(Plane(origin=(8, 25, 9.4), x_dir=(-0.9996219169112968, 0.027495876610586775, -6.983036009170595e-15), z_dir=(0, 0, -1))) as chamfer3_piece_8_section:
        Polygon((CHAMFER3_SIZE * 0.999621916911, -CHAMFER3_SIZE * 0.0274958766106), (-CHAMFER3_SIZE * 0.0274958766106, -CHAMFER3_SIZE * 0.999621916911), (0, 0), align=None)
    chamfer3_piece_8 = extrude(amount=18.8, mode=Mode.PRIVATE)
    chamfer3_piece_8 = split(chamfer3_piece_8, bisect_by=Plane(origin=(5.125, 24.003702171, 7.2625), z_dir=(1, 0, 0)), keep=Keep.TOP, mode=Mode.PRIVATE)
    chamfer3_piece_8 = split(chamfer3_piece_8, bisect_by=Plane(origin=(7.023766044, 24.003702171, 5.125), z_dir=(0, 0, 1)), keep=Keep.TOP, mode=Mode.PRIVATE)
    add(chamfer3_piece_8)
    with BuildSketch(Plane(origin=(8, 25, 9.4), x_dir=(-0.9996219169112968, 0.027495876610586775, -6.983036009170595e-15), z_dir=(0, 0, -1))) as chamfer3_piece_9_section:
        Polygon((CHAMFER3_SIZE * 0.999621916911, -CHAMFER3_SIZE * 0.0274958766106), (-CHAMFER3_SIZE * 0.0274958766106, -CHAMFER3_SIZE * 0.999621916911), (0, 0), align=None)
    chamfer3_piece_9 = extrude(amount=18.8, mode=Mode.PRIVATE)
    chamfer3_piece_9 = split(chamfer3_piece_9, bisect_by=Plane(origin=(7.023766044, 24.003702171, -5.125), z_dir=(0, 0, 1)), keep=Keep.TOP, mode=Mode.PRIVATE)
    chamfer3_piece_9 = split(chamfer3_piece_9, bisect_by=Plane(origin=(5.125, 24.003702171, 0), z_dir=(1, 0, 0)), keep=Keep.TOP, mode=Mode.PRIVATE)
    chamfer3_piece_9 = split(chamfer3_piece_9, bisect_by=Plane(origin=(7.023766044, 24.003702171, 5.125), z_dir=(0, 0, -1)), keep=Keep.TOP, mode=Mode.PRIVATE)
    add(chamfer3_piece_9)
    with BuildSketch(Plane(origin=(8, 25, 9.4), x_dir=(-0.9996219169112968, 0.027495876610586775, -6.983036009170595e-15), z_dir=(0, 0, -1))) as chamfer3_piece_10_section:
        Polygon((CHAMFER3_SIZE * 0.999621916911, -CHAMFER3_SIZE * 0.0274958766106), (-CHAMFER3_SIZE * 0.0274958766106, -CHAMFER3_SIZE * 0.999621916911), (0, 0), align=None)
    chamfer3_piece_10 = extrude(amount=18.8, mode=Mode.PRIVATE)
    chamfer3_piece_10 = split(chamfer3_piece_10, bisect_by=Plane(origin=(5.041671012, 25.046535353, -5.125), z_dir=(0, 0, -1)), keep=Keep.TOP, mode=Mode.PRIVATE)
    chamfer3_piece_10 = split(chamfer3_piece_10, bisect_by=Plane(origin=(5.125, 25.046535353, -7.2625), z_dir=(-1, 0, 0)), keep=Keep.TOP, mode=Mode.PRIVATE)
    add(chamfer3_piece_10)
    with BuildSketch(Plane(origin=(8, 25, 9.4), x_dir=(-0.9996219169112968, 0.027495876610586775, -6.983036009170595e-15), z_dir=(0, 0, -1))) as chamfer3_piece_11_section:
        Polygon((CHAMFER3_SIZE * 0.999621916911, -CHAMFER3_SIZE * 0.0274958766106), (-CHAMFER3_SIZE * 0.0274958766106, -CHAMFER3_SIZE * 0.999621916911), (0, 0), align=None)
    chamfer3_piece_11 = extrude(amount=18.8, mode=Mode.PRIVATE)
    chamfer3_piece_11 = split(chamfer3_piece_11, bisect_by=Plane(origin=(7.023766044, 24.003702171, -5.125), z_dir=(0, 0, -1)), keep=Keep.TOP, mode=Mode.PRIVATE)
    chamfer3_piece_11 = split(chamfer3_piece_11, bisect_by=Plane(origin=(5.125, 24.003702171, -7.2625), z_dir=(1, 0, 0)), keep=Keep.TOP, mode=Mode.PRIVATE)
    add(chamfer3_piece_11)


solid = part.part
